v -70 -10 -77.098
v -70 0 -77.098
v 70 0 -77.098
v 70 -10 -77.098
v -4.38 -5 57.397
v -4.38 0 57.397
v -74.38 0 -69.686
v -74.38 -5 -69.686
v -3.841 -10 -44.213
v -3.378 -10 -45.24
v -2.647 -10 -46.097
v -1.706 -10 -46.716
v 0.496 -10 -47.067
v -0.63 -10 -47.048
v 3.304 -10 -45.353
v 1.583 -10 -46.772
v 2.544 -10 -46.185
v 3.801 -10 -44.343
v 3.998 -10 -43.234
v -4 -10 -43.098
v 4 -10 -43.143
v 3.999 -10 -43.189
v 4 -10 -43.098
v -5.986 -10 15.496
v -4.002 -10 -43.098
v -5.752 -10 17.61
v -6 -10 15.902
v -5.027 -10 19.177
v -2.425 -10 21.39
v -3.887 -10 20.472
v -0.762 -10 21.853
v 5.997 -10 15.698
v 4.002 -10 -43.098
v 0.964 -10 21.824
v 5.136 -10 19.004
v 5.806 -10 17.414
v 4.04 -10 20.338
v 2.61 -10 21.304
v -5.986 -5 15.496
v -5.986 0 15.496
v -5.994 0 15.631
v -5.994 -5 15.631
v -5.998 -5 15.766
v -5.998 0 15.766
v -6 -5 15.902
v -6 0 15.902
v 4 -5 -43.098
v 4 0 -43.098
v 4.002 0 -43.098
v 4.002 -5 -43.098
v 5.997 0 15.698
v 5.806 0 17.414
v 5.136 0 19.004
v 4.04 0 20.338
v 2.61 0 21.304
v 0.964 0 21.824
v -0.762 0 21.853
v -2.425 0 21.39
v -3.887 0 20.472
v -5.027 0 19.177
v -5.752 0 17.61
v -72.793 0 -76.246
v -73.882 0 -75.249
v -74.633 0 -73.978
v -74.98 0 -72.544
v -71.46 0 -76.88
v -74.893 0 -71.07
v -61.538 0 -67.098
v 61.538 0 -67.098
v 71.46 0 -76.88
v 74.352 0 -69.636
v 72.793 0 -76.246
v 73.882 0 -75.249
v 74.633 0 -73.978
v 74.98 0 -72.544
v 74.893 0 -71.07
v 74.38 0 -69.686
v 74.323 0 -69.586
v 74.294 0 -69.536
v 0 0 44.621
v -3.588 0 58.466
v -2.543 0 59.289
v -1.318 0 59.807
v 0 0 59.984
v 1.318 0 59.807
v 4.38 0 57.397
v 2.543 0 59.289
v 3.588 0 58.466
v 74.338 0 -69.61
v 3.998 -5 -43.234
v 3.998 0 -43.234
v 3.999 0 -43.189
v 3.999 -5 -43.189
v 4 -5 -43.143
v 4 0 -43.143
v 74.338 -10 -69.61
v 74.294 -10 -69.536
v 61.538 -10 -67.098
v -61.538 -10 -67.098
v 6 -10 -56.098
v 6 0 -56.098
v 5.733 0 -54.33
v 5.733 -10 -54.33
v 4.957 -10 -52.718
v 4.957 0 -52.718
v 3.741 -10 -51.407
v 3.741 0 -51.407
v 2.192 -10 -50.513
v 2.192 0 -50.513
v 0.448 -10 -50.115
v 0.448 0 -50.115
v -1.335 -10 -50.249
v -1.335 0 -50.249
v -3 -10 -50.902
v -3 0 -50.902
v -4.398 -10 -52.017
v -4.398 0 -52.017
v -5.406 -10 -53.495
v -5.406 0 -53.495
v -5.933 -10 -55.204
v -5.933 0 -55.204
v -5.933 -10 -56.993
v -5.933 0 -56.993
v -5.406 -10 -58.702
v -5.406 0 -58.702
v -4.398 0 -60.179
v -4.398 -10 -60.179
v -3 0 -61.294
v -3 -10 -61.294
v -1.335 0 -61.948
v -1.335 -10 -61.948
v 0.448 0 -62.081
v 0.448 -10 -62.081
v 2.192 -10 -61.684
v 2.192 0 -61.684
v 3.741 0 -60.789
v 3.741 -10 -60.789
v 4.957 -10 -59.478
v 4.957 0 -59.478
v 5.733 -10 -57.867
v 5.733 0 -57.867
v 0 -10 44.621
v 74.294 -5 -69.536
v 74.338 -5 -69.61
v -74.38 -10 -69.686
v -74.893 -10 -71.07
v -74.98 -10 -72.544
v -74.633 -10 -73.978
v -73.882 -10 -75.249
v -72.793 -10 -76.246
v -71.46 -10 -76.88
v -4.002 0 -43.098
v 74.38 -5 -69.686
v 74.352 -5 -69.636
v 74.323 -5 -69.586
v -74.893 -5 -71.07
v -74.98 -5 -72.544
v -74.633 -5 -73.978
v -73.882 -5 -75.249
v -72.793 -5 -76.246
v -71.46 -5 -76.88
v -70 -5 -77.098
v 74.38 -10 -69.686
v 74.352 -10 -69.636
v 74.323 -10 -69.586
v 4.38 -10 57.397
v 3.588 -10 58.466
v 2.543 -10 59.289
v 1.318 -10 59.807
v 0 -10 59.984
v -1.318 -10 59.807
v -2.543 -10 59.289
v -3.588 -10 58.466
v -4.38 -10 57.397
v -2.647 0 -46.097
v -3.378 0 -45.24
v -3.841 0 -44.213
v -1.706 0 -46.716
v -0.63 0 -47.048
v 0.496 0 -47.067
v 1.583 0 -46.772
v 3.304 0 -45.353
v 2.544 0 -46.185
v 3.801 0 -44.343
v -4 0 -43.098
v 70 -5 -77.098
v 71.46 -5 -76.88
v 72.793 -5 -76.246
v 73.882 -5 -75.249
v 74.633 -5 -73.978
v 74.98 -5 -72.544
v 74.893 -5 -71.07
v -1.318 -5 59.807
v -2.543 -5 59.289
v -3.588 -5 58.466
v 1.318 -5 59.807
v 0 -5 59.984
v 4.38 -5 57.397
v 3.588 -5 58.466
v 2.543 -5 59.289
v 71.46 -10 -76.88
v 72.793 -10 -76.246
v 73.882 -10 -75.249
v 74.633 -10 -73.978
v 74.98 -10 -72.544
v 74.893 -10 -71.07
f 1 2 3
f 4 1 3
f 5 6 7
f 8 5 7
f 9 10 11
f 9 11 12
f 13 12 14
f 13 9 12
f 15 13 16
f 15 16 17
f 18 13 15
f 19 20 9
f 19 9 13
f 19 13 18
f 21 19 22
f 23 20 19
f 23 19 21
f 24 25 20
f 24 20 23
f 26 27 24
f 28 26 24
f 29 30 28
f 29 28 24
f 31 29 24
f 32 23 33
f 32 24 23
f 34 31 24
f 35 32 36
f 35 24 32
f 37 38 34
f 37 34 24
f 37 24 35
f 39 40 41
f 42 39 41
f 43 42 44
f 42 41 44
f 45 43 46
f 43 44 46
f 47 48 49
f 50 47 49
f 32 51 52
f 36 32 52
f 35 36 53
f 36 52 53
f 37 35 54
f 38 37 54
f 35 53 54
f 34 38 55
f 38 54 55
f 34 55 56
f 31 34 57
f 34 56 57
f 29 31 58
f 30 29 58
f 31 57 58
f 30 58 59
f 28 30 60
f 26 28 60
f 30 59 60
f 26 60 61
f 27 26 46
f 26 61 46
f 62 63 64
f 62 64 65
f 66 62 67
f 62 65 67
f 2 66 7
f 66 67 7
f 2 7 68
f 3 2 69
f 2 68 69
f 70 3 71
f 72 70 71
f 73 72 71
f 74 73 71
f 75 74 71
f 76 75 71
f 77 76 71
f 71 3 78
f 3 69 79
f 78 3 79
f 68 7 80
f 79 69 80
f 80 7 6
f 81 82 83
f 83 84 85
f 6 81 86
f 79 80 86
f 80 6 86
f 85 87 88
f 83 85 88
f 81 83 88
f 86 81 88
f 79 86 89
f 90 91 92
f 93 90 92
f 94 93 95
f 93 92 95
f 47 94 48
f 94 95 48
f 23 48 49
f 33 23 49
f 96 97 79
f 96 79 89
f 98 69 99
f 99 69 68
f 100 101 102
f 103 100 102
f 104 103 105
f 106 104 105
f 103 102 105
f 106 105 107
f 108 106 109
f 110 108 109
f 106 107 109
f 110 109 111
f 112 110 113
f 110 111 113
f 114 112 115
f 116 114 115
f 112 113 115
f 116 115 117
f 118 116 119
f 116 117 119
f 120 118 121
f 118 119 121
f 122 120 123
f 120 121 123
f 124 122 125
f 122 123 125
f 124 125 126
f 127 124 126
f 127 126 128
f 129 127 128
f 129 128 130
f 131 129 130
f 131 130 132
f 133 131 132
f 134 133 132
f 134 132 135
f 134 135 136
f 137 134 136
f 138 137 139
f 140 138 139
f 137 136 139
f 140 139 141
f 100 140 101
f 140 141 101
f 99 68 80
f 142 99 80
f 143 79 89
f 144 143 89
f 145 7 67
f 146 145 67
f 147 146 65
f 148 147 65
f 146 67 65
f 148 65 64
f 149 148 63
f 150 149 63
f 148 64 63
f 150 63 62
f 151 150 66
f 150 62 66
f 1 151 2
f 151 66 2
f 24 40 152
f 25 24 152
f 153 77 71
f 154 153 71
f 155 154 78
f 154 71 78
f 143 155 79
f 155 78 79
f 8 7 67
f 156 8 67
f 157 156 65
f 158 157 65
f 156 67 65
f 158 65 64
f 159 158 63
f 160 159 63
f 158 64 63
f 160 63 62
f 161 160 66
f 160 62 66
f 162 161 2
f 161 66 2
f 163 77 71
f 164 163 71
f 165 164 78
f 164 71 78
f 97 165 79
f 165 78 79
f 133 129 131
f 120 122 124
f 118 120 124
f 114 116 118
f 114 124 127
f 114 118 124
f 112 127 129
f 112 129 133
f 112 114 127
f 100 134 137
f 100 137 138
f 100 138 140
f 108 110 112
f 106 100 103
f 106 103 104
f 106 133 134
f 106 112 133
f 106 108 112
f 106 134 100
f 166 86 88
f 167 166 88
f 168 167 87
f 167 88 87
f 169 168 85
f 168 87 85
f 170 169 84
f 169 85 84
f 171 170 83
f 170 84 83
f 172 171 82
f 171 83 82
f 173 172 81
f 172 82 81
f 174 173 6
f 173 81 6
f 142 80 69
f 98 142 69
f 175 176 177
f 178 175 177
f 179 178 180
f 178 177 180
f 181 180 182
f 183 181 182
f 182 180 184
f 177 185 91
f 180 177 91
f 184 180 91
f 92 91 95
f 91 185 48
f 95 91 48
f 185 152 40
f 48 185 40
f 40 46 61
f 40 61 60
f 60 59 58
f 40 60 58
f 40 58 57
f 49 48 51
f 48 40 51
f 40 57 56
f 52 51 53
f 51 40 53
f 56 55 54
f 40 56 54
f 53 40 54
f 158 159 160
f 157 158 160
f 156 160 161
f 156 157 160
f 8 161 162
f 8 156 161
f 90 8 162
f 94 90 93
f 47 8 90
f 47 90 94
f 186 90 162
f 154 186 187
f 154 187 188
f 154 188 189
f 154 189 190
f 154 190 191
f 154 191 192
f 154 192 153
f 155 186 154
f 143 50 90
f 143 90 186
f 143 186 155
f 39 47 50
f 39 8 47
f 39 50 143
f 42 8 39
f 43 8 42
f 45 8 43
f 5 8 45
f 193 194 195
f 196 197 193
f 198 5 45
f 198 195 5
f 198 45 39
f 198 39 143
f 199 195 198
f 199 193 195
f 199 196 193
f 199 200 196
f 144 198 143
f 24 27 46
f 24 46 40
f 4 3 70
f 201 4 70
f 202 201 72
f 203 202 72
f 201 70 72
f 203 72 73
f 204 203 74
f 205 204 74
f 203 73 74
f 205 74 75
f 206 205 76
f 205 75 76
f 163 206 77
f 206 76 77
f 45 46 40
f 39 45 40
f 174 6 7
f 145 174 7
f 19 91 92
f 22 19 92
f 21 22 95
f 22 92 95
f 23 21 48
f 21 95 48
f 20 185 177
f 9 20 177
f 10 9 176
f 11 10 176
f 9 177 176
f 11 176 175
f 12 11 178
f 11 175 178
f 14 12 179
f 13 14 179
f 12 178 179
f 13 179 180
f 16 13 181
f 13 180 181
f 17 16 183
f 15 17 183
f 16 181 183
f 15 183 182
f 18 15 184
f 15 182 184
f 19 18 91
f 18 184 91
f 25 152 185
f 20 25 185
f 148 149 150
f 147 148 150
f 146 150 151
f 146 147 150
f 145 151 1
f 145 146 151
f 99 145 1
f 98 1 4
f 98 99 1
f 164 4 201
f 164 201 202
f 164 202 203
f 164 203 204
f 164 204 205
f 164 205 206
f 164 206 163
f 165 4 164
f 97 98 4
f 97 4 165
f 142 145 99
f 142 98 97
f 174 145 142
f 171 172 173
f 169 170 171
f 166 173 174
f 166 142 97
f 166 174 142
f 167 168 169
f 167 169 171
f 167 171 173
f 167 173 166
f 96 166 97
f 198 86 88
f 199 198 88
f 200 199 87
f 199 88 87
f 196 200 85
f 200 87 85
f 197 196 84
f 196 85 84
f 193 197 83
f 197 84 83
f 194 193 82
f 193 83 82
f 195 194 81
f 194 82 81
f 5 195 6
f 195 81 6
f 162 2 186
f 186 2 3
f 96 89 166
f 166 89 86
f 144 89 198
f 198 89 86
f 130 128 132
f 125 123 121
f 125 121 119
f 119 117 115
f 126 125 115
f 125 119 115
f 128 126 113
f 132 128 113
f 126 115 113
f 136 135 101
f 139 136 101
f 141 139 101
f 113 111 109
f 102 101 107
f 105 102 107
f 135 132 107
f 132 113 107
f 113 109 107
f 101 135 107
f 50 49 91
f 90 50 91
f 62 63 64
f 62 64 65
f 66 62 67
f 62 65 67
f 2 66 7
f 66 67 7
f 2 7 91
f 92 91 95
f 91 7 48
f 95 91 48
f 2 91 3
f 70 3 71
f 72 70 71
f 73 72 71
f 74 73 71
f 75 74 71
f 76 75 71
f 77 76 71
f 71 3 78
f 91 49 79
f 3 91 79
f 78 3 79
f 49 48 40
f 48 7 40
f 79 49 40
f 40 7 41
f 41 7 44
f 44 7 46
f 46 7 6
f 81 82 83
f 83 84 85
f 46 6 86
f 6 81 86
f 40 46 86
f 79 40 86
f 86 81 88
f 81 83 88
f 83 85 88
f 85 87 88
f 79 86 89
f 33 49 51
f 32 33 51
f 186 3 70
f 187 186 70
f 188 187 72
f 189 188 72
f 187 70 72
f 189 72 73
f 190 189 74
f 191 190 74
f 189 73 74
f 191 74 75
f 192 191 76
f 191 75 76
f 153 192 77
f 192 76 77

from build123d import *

# Parameters (mm, degrees)
F0_R     = 6
F1_DEPTH = 5
F2_DEPTH = 10


with BuildPart() as f1:
    # F0 (on Front) → F1 (new body)
    with BuildSketch(Plane.XZ):
        with BuildLine():
            Line((-4.3795573481, 57.3967428379), (-74.3795573481, -69.6859074334))
            ThreePointArc((-74.3795573481, -69.6859074334), (-74.3047529862, -74.6417096309), (-70, -77.0982667422))
            Line((-70, -77.0982667422), (70, -77.0982667422))
            ThreePointArc((70, -77.0982667422), (74.3047529862, -74.6417096309), (74.3795573481, -69.6859074334))
            ThreePointArc((74.3795573481, -69.6859074334), (74.3373330647, -69.6107897301), (74.2938204963, -69.536410863))
            Line((74.2938204963, -69.536410863), (74.3379773029, -69.610420257))
            Line((74.3379773029, -69.610420257), (4.3795573481, 57.3967428379))
            ThreePointArc((4.3795573481, 57.3967428379), (0, 59.9843835292), (-4.3795573481, 57.3967428379))
        make_face()
        Polygon((61.5375473825, -67.0982667422), (-61.5375473825, -67.0982667422), (0, 44.6210848659), align=None, mode=Mode.SUBTRACT)
        Polygon((0, 44.6210848659), (-61.5375473825, -67.0982667422), (61.5375473825, -67.0982667422), align=None)
        with BuildLine():
            ThreePointArc((-6, 15.9017332578), (0.1017095297, 21.9008711268), (5.9965517239, 15.6983434273))
            Line((5.9965517239, 15.6983434273), (4.0023001742, -43.0982666969))
            Line((4.0023001742, -43.0982666969), (3.9977011492, -43.2338599626))
            ThreePointArc((3.9977011492, -43.2338599626), (-0.0678063305, -47.0976919886), (-4, -43.0982667875))
            Line((-4, -43.0982667875), (-4.0022922668, -43.0982667875))
            Line((-4.0022922668, -43.0982667875), (-5.9862582037, 15.4958851105))
            ThreePointArc((-5.9862582037, 15.4958851105), (-5.9965635668, 15.698692895), (-6, 15.9017332578))
        make_face(mode=Mode.SUBTRACT)
        with Locations((0, -56.0982667422)):
            Circle(F0_R, mode=Mode.SUBTRACT)
        with BuildLine():
            Line((4.0023001742, -43.0982666969), (5.9965517239, 15.6983434273))
            ThreePointArc((5.9965517239, 15.6983434273), (0.1017095297, 21.9008711268), (-6, 15.9017332578))
            Line((-6, 15.9017332578), (-5.9862582037, 15.4958851105))
            Line((-5.9862582037, 15.4958851105), (-4.0022922668, -43.0982667875))
            Line((-4.0022922668, -43.0982667875), (-4, -43.0982667875))
            ThreePointArc((-4, -43.0982667875), (-0.0678063305, -47.0976919886), (3.9977011492, -43.2338599626))
            ThreePointArc((3.9977011492, -43.2338599626), (3.9994252464, -43.1660730727), (4, -43.0982666968))
            Line((4, -43.0982666968), (4.0023001742, -43.0982666969))
        make_face()
        with Locations((0, -56.0982667422)):
            Circle(F0_R)
    extrude(amount=F1_DEPTH)


with BuildPart() as f2:
    # F0 (on Front) → F2 (new body)
    with BuildSketch(Plane.XZ):
        with BuildLine():
            Line((4.0023001742, -43.0982666969), (5.9965517239, 15.6983434273))
            ThreePointArc((5.9965517239, 15.6983434273), (0.1017095297, 21.9008711268), (-6, 15.9017332578))
            Line((-6, 15.9017332578), (-5.9862582037, 15.4958851105))
            Line((-5.9862582037, 15.4958851105), (-4.0022922668, -43.0982667875))
            Line((-4.0022922668, -43.0982667875), (-4, -43.0982667875))
            ThreePointArc((-4, -43.0982667875), (-0.0678063305, -47.0976919886), (3.9977011492, -43.2338599626))
            ThreePointArc((3.9977011492, -43.2338599626), (3.9994252464, -43.1660730727), (4, -43.0982666968))
            Line((4, -43.0982666968), (4.0023001742, -43.0982666969))
        make_face()
    extrude(amount=F2_DEPTH)


with BuildPart() as f2b:
    # F0 (on Front) → F2, piece 2 (new body)
    with BuildSketch(Plane.XZ):
        with Locations((0, -56.0982667422)):
            Circle(F0_R)
    extrude(amount=F2_DEPTH)


with BuildPart() as f2c:
    # F0 (on Front) → F2, piece 3 (new body)
    with BuildSketch(Plane.XZ):
        with BuildLine():
            Line((-4.3795573481, 57.3967428379), (-74.3795573481, -69.6859074334))
            ThreePointArc((-74.3795573481, -69.6859074334), (-74.3047529862, -74.6417096309), (-70, -77.0982667422))
            Line((-70, -77.0982667422), (70, -77.0982667422))
            ThreePointArc((70, -77.0982667422), (74.3047529862, -74.6417096309), (74.3795573481, -69.6859074334))
            ThreePointArc((74.3795573481, -69.6859074334), (74.3373330647, -69.6107897301), (74.2938204963, -69.536410863))
            Line((74.2938204963, -69.536410863), (74.3379773029, -69.610420257))
            Line((74.3379773029, -69.610420257), (4.3795573481, 57.3967428379))
            ThreePointArc((4.3795573481, 57.3967428379), (0, 59.9843835292), (-4.3795573481, 57.3967428379))
        make_face()
        Polygon((61.5375473825, -67.0982667422), (-61.5375473825, -67.0982667422), (0, 44.6210848659), align=None, mode=Mode.SUBTRACT)
    extrude(amount=F2_DEPTH)


solid = Compound([f1.part, f2.part, f2b.part, f2c.part])
